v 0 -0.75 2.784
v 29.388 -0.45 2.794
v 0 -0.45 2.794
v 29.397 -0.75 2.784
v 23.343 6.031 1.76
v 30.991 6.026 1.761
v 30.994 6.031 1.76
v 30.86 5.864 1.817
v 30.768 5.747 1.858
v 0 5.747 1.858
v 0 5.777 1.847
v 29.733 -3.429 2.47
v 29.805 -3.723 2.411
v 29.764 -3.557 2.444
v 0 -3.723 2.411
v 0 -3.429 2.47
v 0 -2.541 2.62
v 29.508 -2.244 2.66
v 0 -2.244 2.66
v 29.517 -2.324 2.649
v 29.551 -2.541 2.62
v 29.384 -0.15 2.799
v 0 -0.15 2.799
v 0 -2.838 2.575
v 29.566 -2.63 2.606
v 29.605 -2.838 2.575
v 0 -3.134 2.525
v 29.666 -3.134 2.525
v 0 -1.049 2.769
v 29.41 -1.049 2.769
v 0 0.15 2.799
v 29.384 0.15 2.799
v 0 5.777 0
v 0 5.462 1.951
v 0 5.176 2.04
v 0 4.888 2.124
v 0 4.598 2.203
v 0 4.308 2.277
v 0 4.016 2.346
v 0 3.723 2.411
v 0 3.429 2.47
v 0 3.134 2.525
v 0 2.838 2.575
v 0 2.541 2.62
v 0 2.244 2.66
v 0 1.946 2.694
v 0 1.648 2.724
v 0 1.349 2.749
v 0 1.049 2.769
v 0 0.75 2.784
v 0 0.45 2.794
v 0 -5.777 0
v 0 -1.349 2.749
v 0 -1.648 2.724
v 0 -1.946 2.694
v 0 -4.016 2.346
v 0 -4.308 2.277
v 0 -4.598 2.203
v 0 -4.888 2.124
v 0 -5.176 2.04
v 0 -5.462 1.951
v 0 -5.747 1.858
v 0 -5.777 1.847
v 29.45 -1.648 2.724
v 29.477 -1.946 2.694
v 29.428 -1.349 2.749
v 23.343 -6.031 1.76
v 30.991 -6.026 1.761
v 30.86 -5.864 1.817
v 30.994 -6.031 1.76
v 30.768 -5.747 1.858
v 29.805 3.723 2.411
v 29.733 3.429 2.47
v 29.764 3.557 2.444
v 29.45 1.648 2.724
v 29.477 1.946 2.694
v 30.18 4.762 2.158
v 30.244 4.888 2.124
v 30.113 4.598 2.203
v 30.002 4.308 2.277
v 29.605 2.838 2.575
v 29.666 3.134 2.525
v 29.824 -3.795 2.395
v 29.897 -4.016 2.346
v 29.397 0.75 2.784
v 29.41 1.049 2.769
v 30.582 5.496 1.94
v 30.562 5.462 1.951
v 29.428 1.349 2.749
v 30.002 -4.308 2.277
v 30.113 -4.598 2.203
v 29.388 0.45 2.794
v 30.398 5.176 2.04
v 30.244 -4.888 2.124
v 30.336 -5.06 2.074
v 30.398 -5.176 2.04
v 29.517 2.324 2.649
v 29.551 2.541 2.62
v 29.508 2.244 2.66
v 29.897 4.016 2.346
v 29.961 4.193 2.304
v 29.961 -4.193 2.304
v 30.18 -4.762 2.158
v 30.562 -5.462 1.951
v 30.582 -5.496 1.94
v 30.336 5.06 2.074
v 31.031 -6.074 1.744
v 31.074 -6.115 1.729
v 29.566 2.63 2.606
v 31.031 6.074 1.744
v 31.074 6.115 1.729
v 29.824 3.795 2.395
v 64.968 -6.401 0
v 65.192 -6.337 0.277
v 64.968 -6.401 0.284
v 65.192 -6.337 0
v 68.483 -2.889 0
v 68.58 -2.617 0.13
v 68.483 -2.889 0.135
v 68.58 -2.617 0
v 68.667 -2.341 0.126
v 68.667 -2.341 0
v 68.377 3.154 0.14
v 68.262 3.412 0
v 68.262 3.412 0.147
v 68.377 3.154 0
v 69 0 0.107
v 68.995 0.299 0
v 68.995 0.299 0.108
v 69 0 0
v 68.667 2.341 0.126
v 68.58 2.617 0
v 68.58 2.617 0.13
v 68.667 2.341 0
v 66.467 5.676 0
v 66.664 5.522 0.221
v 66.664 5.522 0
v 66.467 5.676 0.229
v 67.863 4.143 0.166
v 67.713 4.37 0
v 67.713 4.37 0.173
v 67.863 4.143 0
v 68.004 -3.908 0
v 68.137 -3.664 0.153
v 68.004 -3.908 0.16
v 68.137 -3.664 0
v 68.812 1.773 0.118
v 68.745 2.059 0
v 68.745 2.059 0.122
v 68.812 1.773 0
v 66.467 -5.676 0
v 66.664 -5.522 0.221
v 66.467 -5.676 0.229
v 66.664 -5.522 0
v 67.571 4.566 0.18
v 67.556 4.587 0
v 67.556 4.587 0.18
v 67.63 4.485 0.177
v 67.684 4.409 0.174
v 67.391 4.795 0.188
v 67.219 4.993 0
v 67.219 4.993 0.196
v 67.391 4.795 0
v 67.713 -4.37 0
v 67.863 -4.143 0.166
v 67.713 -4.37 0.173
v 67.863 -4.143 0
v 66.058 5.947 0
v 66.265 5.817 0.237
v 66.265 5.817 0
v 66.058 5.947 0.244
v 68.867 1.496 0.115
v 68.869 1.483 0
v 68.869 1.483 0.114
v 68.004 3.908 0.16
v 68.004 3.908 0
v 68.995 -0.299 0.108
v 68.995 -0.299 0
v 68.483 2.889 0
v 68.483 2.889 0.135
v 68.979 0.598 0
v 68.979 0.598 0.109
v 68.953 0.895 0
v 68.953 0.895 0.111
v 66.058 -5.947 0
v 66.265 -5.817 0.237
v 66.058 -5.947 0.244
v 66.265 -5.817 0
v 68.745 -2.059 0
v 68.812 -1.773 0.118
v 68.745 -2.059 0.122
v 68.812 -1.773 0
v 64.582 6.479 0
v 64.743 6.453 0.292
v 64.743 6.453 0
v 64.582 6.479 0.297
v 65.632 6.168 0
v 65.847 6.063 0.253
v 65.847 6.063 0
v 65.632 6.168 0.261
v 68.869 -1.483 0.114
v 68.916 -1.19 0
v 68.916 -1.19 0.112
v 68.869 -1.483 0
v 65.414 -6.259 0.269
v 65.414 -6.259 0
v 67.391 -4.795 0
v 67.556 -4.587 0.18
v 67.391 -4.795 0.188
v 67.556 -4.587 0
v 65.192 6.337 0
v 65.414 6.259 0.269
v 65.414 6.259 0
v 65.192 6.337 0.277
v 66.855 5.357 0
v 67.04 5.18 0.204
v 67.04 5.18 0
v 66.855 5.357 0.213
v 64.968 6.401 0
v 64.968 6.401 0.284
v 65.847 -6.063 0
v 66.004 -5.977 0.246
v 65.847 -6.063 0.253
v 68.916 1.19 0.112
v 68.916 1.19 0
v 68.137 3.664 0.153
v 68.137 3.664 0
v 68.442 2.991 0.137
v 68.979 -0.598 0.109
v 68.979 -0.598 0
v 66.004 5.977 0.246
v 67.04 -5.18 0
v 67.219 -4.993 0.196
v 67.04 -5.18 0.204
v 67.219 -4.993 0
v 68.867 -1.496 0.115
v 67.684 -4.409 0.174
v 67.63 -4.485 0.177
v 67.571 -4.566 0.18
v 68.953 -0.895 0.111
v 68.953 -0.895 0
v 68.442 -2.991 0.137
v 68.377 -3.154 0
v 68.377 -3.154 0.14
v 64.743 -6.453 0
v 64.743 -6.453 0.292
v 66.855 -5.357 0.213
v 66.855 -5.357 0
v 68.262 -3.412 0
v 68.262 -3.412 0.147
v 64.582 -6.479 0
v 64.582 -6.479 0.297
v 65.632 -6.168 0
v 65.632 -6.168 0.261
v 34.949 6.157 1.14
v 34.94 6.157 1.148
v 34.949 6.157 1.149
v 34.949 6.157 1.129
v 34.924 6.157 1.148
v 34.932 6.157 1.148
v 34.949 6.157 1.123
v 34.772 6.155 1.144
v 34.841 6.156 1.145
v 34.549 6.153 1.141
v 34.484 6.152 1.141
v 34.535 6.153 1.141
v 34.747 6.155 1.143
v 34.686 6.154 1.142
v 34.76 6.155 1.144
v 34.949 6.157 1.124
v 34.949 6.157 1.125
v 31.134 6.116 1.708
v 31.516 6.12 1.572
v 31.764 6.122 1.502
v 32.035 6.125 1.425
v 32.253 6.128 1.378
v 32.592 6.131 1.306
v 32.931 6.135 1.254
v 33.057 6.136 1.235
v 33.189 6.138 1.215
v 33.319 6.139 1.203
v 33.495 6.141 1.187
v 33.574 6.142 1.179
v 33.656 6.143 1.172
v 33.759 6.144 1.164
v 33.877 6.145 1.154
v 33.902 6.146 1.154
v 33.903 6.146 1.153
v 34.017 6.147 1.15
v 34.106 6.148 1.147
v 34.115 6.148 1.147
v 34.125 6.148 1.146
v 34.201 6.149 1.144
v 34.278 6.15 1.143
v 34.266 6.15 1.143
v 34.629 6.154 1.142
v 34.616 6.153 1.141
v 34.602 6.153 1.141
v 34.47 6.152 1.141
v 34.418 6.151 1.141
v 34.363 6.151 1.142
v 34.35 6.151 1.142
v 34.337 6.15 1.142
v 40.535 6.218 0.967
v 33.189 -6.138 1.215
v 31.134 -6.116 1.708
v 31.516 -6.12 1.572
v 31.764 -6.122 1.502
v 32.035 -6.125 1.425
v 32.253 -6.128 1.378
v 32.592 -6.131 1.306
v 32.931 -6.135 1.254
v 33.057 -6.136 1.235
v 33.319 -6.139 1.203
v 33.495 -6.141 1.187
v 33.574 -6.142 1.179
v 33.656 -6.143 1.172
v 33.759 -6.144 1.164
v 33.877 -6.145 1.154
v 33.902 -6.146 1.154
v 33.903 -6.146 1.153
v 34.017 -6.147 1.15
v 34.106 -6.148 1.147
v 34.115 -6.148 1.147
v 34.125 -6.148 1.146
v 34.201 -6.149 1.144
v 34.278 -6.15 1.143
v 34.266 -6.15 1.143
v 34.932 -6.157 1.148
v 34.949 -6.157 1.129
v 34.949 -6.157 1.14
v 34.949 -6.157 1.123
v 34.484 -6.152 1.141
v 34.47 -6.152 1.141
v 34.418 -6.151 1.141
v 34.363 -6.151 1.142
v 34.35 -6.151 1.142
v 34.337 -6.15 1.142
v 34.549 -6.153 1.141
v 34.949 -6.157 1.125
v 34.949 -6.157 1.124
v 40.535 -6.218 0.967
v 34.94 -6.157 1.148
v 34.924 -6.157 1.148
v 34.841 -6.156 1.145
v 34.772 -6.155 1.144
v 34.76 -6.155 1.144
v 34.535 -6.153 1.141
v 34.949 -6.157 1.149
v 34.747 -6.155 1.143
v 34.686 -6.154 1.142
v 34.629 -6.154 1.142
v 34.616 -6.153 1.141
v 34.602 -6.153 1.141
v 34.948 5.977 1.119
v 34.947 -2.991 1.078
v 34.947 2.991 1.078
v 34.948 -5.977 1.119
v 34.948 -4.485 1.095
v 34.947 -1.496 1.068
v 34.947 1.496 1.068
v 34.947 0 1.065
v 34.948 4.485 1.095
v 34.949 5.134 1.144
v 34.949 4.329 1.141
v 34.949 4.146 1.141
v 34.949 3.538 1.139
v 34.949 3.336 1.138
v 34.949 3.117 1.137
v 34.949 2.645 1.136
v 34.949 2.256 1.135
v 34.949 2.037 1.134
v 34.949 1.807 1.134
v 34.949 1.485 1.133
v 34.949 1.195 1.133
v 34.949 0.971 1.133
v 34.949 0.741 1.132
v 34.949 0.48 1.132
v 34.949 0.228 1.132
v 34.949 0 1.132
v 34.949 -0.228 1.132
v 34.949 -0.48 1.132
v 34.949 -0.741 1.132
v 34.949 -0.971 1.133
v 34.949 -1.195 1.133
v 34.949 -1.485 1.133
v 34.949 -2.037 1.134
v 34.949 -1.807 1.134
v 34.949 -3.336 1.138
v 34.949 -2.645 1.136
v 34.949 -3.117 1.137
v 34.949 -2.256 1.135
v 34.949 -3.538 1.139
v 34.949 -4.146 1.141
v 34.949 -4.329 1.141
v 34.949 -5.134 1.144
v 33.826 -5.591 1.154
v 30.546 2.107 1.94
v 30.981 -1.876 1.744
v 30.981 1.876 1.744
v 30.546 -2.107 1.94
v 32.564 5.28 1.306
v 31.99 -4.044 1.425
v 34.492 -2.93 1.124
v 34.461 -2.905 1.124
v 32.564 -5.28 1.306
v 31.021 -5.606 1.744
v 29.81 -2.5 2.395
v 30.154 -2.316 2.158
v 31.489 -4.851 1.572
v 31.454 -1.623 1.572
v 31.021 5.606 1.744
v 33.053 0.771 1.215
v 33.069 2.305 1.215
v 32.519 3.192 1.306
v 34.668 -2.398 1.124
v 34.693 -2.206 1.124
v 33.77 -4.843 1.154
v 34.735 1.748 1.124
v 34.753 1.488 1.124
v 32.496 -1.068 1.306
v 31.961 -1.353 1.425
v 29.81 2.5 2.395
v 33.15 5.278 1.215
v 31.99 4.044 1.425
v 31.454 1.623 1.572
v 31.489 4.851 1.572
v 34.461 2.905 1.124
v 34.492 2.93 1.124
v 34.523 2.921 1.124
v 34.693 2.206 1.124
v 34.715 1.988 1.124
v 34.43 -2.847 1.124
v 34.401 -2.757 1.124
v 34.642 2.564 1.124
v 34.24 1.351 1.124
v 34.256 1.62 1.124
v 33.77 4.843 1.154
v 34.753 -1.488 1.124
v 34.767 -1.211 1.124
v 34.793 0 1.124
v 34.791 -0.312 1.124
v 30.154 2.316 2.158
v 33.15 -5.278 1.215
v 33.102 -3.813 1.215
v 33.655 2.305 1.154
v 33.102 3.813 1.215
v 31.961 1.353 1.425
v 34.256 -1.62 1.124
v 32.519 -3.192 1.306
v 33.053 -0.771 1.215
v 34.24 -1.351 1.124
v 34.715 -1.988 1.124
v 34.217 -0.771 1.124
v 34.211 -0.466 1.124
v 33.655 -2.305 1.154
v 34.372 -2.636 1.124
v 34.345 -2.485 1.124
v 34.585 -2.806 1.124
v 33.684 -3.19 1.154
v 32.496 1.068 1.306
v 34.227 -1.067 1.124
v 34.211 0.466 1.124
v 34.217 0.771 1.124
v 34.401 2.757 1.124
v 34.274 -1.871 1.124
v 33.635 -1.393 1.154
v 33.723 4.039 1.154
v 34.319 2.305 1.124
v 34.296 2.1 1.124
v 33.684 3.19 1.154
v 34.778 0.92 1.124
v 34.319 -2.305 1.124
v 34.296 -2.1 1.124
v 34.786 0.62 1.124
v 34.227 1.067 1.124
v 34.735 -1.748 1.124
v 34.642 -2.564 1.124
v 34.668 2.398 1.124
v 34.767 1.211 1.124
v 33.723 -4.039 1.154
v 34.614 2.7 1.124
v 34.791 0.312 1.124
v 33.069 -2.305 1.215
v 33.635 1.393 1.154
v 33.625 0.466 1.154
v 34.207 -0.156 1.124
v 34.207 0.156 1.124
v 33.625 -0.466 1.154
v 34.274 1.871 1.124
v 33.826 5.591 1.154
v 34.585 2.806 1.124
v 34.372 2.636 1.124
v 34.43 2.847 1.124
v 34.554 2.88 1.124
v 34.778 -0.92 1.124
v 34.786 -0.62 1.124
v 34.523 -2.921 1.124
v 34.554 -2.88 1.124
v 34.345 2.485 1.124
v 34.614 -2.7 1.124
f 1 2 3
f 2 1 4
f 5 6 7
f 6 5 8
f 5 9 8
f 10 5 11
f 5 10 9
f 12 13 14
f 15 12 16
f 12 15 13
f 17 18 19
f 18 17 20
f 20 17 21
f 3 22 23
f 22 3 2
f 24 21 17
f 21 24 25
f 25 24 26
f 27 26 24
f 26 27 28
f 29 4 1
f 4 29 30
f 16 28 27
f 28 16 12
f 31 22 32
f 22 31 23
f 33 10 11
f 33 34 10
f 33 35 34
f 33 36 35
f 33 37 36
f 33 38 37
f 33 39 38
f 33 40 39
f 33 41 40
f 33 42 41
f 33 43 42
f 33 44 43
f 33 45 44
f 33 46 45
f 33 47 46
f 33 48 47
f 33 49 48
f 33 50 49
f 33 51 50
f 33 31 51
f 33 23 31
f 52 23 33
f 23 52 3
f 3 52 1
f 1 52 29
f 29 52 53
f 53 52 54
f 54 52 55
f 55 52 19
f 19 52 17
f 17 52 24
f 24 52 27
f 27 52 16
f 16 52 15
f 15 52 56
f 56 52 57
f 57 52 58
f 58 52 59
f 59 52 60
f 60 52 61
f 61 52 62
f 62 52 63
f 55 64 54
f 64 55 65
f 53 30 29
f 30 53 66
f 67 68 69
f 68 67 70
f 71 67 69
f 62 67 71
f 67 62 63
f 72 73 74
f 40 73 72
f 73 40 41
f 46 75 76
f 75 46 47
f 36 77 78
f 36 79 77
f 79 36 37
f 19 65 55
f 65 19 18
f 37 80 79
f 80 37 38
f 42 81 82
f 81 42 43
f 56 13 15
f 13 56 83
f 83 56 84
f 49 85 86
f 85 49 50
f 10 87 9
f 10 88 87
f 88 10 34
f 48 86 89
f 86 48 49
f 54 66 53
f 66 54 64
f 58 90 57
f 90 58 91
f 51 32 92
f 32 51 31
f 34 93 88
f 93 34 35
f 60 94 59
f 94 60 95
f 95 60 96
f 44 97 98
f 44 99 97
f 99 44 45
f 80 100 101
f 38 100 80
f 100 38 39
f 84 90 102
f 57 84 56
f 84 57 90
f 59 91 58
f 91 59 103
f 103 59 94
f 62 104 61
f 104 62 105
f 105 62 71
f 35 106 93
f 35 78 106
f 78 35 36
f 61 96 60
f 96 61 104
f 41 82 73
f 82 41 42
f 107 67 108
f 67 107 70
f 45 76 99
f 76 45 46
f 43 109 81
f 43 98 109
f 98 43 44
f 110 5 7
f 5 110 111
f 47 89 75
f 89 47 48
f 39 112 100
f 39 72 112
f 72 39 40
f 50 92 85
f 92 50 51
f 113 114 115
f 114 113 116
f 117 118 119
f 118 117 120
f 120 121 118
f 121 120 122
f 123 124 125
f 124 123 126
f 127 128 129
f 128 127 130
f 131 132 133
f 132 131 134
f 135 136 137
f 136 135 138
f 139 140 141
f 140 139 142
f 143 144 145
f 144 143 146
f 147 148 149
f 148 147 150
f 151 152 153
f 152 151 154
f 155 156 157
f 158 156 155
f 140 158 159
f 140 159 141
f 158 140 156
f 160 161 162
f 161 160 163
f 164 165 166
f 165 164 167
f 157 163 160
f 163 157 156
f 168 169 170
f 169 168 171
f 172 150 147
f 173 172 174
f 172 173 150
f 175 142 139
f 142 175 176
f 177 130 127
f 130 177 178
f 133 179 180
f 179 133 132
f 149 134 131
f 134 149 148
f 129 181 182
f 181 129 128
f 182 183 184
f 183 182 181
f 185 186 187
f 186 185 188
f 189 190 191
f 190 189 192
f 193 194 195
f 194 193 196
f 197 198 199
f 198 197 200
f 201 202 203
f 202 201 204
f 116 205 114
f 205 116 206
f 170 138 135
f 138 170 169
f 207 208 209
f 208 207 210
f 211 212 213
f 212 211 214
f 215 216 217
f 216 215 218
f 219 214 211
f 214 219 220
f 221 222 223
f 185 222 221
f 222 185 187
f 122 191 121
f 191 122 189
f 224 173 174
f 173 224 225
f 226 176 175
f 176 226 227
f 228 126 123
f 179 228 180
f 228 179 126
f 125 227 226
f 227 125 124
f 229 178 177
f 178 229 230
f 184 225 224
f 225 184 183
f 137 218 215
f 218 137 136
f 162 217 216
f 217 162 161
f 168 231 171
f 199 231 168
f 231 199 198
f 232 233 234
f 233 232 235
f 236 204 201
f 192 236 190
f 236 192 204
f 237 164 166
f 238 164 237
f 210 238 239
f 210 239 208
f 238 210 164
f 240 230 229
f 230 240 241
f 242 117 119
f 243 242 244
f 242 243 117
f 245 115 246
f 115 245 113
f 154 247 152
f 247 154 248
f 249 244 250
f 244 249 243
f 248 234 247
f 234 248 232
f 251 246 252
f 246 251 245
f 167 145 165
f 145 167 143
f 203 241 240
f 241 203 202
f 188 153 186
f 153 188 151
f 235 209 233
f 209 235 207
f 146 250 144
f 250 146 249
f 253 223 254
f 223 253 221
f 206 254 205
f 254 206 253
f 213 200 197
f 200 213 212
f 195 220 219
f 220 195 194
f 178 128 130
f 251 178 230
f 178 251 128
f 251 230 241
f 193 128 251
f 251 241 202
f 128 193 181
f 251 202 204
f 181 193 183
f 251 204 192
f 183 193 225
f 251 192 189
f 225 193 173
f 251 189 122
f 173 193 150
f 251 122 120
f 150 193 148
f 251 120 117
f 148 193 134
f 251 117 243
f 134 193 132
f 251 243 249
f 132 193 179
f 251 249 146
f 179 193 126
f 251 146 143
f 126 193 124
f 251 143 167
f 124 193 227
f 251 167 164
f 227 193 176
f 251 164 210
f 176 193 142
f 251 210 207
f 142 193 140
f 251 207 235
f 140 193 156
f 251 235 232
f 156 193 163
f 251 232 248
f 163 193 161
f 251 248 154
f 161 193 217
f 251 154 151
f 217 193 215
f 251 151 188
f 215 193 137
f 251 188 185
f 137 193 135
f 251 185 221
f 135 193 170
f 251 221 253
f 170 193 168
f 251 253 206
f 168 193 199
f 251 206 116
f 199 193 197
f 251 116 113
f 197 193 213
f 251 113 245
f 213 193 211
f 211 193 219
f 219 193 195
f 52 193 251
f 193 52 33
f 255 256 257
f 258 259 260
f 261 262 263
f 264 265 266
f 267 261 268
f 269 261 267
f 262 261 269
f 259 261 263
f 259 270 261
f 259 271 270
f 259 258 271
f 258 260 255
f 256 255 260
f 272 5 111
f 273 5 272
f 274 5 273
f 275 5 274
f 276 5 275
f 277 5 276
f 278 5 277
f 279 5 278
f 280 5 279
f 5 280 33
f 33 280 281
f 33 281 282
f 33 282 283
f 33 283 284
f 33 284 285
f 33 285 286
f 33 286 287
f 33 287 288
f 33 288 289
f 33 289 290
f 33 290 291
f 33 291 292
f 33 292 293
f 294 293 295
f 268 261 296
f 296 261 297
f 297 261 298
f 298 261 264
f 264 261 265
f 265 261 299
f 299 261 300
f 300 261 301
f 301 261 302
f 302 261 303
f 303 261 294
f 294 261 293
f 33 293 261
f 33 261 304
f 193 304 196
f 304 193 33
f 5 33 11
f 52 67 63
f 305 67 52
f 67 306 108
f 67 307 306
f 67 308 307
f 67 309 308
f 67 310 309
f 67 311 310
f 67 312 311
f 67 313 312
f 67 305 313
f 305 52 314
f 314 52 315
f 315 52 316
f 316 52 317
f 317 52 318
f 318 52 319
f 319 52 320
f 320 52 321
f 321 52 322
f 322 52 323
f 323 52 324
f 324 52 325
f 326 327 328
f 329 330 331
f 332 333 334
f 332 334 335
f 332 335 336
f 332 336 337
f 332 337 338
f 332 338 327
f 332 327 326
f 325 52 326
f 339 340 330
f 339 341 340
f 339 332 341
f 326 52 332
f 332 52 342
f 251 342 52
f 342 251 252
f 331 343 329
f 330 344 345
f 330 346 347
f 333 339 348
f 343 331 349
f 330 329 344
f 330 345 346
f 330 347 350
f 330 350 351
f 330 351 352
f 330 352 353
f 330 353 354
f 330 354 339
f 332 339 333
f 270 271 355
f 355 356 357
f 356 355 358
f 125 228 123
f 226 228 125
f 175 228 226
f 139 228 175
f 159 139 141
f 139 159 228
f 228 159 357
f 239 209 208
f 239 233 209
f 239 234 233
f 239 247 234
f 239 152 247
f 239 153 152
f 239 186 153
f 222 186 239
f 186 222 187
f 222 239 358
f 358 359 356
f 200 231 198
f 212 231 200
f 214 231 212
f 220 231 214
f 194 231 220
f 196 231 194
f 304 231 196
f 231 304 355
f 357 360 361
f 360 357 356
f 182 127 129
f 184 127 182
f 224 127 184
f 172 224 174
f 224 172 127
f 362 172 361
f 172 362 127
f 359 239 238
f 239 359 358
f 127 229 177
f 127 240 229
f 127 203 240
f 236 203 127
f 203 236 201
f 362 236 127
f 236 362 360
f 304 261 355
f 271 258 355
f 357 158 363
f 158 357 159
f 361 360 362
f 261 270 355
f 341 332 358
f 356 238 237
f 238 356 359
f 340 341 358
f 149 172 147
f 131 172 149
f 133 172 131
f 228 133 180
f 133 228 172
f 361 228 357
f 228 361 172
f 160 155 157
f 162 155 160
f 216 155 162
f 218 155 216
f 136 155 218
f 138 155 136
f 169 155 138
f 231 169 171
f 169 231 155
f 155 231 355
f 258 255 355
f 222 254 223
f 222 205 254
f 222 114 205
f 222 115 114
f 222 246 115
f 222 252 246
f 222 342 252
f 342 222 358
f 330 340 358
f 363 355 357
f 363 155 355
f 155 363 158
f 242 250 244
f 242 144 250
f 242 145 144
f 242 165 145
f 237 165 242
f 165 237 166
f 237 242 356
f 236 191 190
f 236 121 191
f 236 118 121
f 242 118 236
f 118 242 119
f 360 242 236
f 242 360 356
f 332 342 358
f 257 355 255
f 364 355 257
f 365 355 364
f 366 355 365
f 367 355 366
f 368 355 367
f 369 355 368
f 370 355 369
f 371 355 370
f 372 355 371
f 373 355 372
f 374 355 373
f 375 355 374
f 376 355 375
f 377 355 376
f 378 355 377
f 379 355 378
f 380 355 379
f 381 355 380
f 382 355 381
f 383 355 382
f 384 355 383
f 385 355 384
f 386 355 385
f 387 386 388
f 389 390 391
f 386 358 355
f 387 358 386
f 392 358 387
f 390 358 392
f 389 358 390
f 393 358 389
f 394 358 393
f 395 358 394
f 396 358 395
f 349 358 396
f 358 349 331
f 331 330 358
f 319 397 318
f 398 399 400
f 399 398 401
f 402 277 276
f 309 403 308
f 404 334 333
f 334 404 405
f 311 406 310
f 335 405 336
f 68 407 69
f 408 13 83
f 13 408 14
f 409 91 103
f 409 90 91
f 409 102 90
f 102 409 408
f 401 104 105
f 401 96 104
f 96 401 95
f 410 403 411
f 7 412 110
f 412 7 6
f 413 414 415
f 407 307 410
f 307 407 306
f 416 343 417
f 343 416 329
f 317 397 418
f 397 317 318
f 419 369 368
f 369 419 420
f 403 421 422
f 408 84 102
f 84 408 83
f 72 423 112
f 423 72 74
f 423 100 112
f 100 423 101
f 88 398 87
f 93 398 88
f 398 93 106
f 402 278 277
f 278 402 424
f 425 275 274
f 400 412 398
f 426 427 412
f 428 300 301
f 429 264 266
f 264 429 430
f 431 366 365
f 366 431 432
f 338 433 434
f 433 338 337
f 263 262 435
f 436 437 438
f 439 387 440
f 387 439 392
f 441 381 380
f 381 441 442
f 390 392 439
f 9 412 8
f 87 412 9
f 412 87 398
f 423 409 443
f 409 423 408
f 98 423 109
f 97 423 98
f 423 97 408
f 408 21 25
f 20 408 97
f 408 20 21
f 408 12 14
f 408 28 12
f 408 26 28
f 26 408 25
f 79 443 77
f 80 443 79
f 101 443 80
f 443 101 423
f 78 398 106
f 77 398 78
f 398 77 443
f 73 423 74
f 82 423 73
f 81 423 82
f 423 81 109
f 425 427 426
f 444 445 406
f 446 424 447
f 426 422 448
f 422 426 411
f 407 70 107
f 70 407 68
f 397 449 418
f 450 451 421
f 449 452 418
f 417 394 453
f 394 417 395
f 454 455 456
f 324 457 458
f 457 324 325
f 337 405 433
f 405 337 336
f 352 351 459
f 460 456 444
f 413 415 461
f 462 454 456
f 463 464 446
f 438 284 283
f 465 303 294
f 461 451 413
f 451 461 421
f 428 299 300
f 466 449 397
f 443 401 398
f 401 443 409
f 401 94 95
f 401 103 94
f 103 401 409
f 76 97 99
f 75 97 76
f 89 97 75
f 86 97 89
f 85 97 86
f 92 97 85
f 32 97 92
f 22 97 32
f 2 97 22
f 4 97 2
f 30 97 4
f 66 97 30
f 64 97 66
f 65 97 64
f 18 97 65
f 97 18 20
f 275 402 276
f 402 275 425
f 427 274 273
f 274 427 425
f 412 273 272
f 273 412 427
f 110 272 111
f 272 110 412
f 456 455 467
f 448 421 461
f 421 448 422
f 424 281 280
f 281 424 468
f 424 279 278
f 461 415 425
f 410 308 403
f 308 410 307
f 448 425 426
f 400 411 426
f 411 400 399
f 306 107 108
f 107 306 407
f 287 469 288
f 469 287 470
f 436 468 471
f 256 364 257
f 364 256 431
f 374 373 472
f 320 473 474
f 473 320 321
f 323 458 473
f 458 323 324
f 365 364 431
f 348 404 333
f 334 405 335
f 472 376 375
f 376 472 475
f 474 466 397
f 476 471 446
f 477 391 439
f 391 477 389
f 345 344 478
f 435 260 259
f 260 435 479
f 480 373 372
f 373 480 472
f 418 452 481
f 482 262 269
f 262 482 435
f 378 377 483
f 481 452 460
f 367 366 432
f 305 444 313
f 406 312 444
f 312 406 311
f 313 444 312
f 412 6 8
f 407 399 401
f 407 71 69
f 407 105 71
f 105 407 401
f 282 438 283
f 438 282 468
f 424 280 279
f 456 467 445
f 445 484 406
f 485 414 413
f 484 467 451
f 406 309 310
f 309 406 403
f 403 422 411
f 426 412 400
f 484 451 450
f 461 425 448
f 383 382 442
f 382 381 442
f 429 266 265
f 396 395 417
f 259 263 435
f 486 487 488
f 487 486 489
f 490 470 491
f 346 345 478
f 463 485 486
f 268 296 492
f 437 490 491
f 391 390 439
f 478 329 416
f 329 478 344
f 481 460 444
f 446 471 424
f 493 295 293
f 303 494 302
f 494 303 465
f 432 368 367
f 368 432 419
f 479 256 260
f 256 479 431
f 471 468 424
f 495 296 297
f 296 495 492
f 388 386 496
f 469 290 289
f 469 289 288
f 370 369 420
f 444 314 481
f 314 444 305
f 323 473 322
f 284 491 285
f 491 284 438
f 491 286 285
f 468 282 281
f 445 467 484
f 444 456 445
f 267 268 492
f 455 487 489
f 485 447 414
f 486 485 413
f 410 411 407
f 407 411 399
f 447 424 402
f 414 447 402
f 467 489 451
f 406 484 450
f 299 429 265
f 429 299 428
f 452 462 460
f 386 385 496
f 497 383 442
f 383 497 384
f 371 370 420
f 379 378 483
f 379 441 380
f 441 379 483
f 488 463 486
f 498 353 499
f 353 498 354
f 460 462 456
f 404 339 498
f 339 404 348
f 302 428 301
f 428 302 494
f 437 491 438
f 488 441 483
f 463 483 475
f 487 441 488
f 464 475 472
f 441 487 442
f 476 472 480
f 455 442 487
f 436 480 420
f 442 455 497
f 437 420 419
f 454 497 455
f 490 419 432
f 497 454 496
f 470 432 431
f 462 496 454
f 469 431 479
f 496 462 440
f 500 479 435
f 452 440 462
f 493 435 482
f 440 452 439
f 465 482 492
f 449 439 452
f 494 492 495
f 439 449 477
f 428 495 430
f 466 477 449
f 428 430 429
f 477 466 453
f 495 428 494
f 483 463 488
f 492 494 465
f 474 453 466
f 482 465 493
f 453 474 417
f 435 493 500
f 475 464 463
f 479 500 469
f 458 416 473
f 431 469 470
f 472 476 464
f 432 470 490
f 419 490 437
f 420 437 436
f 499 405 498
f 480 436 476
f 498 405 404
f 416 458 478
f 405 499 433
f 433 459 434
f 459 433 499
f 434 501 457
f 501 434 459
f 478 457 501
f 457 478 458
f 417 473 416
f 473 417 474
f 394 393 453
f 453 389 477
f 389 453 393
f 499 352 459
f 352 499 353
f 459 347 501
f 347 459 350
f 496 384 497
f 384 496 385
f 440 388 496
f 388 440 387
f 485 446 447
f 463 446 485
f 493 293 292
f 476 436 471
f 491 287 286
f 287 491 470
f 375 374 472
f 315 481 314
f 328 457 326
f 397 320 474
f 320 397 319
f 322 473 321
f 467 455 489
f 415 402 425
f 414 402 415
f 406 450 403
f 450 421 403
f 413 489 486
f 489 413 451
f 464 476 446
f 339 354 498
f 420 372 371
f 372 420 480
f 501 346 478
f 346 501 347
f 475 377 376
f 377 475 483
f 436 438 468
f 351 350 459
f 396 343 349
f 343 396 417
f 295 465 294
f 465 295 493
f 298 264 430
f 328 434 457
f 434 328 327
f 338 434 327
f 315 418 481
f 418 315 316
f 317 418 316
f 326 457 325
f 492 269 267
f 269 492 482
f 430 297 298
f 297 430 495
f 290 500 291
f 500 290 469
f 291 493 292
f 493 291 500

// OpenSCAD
$fs=0.3;
$fa=0.5;

/* [Global] */

// Reed Overall Length (mm)
length=69;
// Reed Back Width (mm)
back_width=11.55;
// Reed Tip End Width (mm)
tip_width=13.05;
// Reed Back Thickness (mm)
back_thickness=2.8;
// Reed Tip Thickness (mm)
tip_thickness=0.09;
// Heart Thickness Level (1-3)
heart=2;
// Reed Tip End Round (mm)
tip_round=5;
// Reed Cylinder Radius (mm)
reed_cyl_rad=18;





module reed_base()
{
	difference()
	{
		union()
		{
			translate([0,0,back_thickness-reed_cyl_rad]) rotate([0,90,0]) 
				cylinder(r=reed_cyl_rad,h=length-tip_round);
 			translate([length-tip_round,0,-0.01]) scale([2 * tip_round / tip_width,1,1])
				cylinder(d=tip_width,h=back_thickness);
		}
        
		translate([-1,-reed_cyl_rad-1,-reed_cyl_rad*2])
			cube([length+2,reed_cyl_rad*2+2,reed_cyl_rad*2]);
		translate([-0.2,back_width*0.5,-1]) rotate([0,0,atan2((tip_width-back_width)*0.5,length)])
			cube([length+1,tip_width,back_thickness+2]);
		translate([-0.2,-back_width*0.5,-1]) rotate([0,0,-atan2((tip_width-back_width)*0.5,length)]) translate([0,-tip_width,0])
			cube([length+1,tip_width,back_thickness+2]);
        
	}
}

module reed()
{
    difference()
    {
        reed_base();
        
        union()
        {
                translate([length+(0.1*(heart+6)),0,tip_width+tip_thickness]) rotate([0,-90 + atan(((back_thickness*(0.1*(heart+2))-tip_thickness)/(length/2))) -0.1,0]) scale([1,5,1])
                    cylinder(h=length/2, r1=tip_width, r2=tip_width, center=false);
     
                translate([length/2,0,back_thickness*(1+((heart+2)*0.1))])scale([2,20,1])
                    sphere(r=back_thickness);
        
        }
    }
}

reed();
